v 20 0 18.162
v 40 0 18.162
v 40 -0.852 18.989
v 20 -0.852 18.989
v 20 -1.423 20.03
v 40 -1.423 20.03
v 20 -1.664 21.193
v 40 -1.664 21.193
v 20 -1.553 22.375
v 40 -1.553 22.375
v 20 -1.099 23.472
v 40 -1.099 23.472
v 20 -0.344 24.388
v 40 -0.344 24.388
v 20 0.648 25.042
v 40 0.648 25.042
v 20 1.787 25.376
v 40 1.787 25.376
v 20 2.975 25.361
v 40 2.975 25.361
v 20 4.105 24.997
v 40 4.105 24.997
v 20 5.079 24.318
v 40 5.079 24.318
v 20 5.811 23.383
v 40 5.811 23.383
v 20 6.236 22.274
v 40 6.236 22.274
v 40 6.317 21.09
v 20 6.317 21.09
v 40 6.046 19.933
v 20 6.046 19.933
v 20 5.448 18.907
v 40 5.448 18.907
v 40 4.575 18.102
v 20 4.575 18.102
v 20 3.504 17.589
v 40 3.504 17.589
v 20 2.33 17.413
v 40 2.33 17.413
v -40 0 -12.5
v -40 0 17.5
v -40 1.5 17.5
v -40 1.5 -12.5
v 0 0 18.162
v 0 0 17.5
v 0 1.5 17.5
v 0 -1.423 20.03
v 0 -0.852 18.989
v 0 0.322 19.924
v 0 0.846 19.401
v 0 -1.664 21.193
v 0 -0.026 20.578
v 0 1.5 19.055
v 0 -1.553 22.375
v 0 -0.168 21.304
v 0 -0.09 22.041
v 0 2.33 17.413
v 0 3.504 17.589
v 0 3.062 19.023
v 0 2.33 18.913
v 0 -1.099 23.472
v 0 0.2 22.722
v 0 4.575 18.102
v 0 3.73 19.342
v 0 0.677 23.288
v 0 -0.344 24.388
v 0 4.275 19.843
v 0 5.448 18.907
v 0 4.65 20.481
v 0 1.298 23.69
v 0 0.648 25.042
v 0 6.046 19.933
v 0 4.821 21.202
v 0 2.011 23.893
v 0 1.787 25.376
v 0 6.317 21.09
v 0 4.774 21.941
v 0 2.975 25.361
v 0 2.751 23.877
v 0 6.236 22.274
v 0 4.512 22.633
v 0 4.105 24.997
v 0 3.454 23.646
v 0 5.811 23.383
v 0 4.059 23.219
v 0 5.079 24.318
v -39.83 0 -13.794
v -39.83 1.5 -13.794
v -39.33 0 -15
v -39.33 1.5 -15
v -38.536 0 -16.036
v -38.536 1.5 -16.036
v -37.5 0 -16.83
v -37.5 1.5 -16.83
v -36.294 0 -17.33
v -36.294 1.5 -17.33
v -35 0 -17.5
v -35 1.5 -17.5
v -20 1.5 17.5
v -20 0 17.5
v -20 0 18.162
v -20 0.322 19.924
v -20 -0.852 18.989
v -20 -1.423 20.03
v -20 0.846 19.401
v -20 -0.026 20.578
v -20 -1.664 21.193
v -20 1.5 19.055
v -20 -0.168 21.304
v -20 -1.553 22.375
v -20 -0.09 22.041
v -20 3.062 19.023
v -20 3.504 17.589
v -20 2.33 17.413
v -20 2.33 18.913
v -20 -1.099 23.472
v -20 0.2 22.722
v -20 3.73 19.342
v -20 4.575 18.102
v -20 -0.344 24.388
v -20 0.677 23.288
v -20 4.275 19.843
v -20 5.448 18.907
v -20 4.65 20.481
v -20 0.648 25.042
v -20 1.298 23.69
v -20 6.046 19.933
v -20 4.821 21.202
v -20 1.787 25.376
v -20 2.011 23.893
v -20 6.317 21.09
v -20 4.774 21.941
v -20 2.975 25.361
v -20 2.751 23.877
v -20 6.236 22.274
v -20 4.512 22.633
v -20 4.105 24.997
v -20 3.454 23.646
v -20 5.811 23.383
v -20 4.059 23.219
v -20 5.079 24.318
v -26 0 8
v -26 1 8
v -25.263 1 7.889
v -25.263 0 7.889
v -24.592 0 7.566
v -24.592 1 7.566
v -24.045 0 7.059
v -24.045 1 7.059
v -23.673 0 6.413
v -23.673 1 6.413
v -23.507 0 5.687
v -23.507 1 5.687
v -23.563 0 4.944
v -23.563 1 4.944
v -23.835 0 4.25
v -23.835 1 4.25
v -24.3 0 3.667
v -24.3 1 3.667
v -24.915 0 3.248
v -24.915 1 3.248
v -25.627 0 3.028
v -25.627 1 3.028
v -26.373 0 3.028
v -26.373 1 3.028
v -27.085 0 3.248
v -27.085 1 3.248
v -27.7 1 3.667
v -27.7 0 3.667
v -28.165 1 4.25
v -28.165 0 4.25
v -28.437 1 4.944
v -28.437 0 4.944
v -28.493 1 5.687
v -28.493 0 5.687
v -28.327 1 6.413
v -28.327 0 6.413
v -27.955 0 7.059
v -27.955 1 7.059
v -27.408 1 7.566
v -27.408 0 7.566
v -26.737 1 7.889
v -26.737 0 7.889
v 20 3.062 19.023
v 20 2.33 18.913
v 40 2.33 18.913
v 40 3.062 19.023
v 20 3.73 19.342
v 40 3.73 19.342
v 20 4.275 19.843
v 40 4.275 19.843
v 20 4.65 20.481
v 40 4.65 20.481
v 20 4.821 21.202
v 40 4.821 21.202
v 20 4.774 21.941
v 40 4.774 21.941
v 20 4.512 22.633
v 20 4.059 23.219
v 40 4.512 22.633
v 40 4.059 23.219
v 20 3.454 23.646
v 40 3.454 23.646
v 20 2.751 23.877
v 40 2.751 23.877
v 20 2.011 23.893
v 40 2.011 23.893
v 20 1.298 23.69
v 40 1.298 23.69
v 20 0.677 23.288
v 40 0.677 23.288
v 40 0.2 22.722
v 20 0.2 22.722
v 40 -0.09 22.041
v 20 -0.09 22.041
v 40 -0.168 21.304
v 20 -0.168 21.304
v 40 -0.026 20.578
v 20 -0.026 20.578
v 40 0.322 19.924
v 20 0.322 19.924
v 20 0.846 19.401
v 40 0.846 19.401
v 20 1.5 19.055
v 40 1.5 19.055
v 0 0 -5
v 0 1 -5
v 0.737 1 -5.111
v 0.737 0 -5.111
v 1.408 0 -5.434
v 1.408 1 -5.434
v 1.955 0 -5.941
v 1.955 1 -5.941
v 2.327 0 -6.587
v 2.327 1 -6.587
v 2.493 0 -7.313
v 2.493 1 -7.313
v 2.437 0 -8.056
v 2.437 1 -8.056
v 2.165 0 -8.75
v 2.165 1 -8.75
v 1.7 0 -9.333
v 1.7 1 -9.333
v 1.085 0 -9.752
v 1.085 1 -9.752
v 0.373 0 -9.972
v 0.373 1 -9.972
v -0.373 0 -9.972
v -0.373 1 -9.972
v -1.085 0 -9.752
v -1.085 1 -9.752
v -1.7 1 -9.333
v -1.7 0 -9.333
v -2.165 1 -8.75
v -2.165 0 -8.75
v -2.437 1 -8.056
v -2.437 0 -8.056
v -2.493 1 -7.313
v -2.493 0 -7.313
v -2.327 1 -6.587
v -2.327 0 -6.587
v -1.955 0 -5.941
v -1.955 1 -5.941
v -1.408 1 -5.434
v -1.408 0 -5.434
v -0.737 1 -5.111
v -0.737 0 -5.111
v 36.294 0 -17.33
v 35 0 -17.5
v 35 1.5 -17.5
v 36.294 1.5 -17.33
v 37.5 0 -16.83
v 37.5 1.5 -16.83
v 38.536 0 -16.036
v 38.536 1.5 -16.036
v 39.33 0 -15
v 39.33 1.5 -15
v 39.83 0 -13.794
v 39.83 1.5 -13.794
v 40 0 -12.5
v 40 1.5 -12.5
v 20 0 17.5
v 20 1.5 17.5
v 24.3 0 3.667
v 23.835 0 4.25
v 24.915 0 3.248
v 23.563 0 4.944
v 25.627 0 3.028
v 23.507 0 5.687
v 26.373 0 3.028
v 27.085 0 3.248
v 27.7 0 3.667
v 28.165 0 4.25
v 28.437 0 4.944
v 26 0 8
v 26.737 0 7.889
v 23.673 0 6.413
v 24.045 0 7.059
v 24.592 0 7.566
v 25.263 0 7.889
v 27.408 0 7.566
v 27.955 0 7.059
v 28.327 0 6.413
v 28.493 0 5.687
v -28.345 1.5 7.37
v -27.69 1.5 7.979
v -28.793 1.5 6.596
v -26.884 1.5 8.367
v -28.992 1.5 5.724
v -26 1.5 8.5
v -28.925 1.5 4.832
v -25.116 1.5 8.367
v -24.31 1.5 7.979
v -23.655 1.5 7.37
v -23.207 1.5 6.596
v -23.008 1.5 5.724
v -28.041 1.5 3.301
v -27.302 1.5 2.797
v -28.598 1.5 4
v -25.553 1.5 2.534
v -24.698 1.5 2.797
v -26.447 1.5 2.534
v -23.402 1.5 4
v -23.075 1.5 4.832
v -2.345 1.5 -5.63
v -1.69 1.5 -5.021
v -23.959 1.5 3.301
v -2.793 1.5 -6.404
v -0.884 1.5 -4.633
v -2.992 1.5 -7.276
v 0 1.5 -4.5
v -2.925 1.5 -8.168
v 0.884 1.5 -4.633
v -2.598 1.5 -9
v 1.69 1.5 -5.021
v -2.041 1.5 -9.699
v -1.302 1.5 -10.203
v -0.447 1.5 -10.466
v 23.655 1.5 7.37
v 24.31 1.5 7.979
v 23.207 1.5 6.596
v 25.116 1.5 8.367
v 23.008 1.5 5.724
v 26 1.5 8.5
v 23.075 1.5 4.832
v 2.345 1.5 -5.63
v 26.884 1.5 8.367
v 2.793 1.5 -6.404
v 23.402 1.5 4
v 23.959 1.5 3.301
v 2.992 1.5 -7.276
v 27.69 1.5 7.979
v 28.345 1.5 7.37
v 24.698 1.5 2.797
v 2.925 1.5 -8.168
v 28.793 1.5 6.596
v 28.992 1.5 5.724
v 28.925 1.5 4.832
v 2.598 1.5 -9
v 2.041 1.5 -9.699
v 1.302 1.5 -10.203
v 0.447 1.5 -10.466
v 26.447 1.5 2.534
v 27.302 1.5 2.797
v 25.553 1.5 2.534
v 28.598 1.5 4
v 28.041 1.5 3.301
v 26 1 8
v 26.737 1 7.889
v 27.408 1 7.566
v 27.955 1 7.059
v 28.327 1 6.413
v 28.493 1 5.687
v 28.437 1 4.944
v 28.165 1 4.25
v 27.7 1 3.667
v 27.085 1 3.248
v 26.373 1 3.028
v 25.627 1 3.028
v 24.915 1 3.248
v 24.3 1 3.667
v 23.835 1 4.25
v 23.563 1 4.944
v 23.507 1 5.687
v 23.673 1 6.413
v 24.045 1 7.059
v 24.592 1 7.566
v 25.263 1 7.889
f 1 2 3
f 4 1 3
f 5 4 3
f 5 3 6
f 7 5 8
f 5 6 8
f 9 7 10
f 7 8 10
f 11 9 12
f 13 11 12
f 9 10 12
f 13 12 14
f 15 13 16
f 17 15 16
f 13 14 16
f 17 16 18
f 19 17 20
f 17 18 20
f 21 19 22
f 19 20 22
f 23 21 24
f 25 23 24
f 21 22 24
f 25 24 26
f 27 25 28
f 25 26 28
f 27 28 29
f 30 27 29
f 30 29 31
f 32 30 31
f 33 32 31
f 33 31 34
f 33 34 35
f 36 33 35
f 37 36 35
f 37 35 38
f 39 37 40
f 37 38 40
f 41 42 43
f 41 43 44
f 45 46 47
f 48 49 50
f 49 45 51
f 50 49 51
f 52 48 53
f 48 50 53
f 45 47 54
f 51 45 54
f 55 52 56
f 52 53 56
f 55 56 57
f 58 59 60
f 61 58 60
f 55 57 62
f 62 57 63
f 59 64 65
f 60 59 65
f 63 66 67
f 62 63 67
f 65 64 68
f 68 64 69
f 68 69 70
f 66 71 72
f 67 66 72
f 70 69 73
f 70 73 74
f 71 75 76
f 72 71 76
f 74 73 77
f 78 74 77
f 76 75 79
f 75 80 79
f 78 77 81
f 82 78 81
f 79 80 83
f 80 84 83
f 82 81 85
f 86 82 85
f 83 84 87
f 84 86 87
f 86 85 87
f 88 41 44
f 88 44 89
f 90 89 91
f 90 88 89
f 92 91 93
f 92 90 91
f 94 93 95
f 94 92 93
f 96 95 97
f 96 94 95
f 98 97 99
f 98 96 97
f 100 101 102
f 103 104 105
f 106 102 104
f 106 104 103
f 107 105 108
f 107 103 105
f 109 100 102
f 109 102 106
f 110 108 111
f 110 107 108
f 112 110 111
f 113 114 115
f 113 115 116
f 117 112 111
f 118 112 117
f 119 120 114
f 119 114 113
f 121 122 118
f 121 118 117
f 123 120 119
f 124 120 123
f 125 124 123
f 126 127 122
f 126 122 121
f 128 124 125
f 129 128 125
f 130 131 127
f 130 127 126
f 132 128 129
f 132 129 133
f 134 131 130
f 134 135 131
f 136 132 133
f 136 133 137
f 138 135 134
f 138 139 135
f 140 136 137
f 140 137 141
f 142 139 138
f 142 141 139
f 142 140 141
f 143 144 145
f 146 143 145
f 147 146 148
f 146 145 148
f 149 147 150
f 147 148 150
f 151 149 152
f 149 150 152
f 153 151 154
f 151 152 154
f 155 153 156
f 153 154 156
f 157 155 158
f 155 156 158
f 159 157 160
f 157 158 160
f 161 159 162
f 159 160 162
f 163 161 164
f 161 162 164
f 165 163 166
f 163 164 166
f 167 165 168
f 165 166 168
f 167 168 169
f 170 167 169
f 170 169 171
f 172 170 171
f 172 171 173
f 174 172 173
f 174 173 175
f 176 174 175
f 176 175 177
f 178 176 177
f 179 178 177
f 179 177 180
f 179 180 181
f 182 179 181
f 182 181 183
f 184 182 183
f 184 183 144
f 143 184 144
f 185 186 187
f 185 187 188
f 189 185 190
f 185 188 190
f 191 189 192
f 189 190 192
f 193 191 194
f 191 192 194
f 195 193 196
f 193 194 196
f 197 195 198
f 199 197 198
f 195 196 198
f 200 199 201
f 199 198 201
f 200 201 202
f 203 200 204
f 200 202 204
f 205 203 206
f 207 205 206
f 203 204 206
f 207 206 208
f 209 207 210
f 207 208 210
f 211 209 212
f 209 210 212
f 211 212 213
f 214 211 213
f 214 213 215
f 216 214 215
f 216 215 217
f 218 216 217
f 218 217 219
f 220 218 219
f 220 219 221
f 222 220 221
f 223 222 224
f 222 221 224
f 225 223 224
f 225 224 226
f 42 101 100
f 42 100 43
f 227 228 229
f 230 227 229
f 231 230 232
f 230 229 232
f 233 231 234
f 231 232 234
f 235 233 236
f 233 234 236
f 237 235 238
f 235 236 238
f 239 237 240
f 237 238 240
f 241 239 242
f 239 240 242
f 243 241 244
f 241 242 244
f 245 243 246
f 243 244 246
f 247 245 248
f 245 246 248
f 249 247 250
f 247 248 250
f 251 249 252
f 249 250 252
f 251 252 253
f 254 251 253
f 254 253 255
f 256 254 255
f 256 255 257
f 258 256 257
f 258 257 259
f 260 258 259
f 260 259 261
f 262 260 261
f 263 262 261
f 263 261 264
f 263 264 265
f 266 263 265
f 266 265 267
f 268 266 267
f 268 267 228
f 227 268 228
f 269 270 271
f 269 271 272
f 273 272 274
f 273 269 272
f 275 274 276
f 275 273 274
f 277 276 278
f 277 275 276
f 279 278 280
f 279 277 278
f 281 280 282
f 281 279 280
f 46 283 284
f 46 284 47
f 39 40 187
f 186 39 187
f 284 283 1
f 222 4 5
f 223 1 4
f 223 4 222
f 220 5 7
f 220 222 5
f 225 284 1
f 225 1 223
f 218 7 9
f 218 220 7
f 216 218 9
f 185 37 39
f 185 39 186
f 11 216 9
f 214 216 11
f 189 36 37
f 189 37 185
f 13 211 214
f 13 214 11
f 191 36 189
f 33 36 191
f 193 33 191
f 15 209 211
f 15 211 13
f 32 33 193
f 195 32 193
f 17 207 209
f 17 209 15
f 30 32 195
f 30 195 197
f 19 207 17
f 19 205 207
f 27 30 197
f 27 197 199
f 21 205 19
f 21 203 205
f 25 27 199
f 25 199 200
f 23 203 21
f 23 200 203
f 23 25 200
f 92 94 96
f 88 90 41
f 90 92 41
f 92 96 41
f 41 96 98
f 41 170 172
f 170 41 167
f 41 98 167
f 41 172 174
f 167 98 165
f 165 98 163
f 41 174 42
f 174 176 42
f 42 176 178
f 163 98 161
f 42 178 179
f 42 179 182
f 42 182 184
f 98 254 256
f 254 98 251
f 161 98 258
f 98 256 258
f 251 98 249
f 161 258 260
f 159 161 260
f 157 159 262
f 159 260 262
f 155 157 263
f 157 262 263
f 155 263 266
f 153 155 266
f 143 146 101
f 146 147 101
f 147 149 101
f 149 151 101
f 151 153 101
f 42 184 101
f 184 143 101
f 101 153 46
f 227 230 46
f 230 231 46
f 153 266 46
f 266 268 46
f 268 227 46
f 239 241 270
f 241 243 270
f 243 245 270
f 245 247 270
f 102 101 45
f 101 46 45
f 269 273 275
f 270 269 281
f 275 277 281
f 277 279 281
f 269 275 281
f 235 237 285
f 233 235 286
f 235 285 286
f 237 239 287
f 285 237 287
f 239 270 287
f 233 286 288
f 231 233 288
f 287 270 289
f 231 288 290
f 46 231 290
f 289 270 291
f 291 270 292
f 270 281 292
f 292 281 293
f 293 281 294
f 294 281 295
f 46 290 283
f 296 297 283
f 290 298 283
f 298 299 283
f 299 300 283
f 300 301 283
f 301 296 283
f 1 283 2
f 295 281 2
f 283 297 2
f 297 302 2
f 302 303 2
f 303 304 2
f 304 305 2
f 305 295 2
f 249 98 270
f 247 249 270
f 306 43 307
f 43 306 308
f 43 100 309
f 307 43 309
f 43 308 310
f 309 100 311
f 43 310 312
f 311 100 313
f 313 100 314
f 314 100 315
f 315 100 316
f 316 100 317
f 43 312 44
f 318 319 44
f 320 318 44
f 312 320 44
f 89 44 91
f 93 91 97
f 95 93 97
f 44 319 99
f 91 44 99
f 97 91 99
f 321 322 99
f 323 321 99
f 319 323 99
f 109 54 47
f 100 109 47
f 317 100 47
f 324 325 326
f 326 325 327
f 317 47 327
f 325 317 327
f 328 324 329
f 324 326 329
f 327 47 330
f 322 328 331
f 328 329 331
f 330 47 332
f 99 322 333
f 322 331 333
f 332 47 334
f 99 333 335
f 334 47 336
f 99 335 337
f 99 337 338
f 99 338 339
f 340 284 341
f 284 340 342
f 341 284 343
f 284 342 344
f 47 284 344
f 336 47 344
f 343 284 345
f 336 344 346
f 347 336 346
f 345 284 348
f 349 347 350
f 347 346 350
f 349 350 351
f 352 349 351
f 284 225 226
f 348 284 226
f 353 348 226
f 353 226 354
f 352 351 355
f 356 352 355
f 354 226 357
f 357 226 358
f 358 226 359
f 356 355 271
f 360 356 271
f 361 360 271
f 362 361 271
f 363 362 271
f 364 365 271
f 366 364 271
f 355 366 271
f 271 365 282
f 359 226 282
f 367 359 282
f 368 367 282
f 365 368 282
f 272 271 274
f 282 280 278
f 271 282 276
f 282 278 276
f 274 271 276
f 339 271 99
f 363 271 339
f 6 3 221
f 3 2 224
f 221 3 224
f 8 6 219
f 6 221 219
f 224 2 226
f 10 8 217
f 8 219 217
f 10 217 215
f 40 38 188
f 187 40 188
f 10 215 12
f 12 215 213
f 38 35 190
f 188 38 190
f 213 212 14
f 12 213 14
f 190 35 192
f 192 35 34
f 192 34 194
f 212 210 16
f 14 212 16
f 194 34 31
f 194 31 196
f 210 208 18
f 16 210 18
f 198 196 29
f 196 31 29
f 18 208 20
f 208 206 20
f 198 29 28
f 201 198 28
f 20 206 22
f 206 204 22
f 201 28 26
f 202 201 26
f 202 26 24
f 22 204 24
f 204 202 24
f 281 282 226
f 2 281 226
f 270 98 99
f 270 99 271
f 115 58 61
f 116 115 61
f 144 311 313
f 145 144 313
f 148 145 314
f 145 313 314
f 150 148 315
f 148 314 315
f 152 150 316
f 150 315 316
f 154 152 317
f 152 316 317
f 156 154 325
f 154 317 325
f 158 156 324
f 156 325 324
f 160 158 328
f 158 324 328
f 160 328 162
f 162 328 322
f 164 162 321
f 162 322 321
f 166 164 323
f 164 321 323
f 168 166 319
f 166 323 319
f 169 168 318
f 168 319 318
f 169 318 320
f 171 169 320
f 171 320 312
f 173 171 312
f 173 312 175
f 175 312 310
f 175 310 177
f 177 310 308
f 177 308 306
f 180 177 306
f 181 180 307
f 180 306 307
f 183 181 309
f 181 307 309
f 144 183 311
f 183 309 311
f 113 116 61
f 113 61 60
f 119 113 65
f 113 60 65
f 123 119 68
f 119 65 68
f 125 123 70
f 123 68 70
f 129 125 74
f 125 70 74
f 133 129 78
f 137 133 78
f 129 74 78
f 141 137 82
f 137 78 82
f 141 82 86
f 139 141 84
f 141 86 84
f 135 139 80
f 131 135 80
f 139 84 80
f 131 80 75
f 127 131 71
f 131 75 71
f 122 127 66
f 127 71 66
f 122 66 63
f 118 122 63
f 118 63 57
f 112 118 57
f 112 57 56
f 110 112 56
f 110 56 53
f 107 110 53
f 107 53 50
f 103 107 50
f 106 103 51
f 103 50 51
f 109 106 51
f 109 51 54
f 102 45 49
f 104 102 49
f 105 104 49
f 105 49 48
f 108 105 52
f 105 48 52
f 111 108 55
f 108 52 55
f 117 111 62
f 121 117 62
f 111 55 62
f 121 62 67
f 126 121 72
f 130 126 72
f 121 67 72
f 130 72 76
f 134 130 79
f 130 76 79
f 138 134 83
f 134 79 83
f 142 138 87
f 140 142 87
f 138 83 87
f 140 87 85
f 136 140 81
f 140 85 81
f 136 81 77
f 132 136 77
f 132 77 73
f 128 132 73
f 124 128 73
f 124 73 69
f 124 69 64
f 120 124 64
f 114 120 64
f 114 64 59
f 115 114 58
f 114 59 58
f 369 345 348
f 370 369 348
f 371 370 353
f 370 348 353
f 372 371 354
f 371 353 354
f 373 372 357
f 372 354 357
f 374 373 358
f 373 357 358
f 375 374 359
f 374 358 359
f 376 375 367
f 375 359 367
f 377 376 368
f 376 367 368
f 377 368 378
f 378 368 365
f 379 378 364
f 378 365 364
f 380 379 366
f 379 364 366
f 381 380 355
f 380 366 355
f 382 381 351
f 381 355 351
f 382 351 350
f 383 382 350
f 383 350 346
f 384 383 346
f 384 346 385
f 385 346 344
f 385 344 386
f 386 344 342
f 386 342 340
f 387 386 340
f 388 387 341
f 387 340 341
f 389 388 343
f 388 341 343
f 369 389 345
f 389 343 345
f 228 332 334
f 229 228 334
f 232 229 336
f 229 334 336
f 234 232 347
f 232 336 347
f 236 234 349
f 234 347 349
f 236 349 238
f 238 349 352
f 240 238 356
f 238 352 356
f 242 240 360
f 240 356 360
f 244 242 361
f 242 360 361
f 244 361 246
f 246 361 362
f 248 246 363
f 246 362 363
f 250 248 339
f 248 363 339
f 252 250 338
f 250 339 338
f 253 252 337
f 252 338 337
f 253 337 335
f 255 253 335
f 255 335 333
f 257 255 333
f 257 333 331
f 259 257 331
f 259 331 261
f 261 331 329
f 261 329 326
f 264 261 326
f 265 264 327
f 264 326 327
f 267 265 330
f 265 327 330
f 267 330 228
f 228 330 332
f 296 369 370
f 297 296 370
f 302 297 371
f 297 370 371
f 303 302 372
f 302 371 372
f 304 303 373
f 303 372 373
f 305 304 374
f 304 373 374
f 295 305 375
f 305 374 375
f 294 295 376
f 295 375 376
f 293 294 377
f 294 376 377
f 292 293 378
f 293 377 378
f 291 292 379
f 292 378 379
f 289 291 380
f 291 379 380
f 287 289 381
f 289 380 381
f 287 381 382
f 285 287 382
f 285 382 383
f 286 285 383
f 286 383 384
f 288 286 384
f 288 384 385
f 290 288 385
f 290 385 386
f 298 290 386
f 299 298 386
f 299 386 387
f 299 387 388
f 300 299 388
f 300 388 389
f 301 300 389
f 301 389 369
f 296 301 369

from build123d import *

# Parameters (mm, degrees)
BOSS_EXTRUDE1_DEPTH = 1.5
BOSS_EXTRUDE3_DEPTH = 20
LPATTERN1_COUNT     = 2
LPATTERN1_PITCH     = 40
SKETCH3_R           = 2.5
CUT_EXTRUDE1_DEPTH  = 20
CHAMFER1_SIZE       = 0.5


with BuildPart() as part:
    # Sketch1 → Boss-Extrude1 (new body)
    with BuildSketch(Plane(origin=(0, 0, 0), x_dir=(1, 0, 0), z_dir=(0, 1, 0))):
        with BuildLine():
            Line((-35, 17.5), (35, 17.5))
            ThreePointArc((35, 17.5), (38.535533906, 16.035533906), (40, 12.5))
            Line((40, 12.5), (40, -17.5))
            Line((40, -17.5), (-40, -17.5))
            Line((-40, -17.5), (-40, 12.5))
            ThreePointArc((-40, 12.5), (-38.535533906, 16.035533906), (-35, 17.5))
        make_face()
    extrude(amount=BOSS_EXTRUDE1_DEPTH)

    # Sketch2 → Boss-Extrude3 (add)
    with BuildSketch(Plane(origin=(40, 0, 0), x_dir=(0, 0, -1), z_dir=(1, 0, 0))):
        with BuildLine():
            Line((-17.5, 0), (-18.161538273, 0))
            ThreePointArc((-18.161538273, 0), (-25.221236665, 3.55341606), (-17.412973279, 2.329843428))
            Line((-17.412973279, 2.329843428), (-18.912973279, 2.329843428))
            ThreePointArc((-18.912973279, 2.329843428), (-23.877281896, 2.750774588), (-19.054719713, 1.5))
            Line((-19.054719713, 1.5), (-17.5, 1.5))
            Line((-17.5, 1.5), (-17.5, 0))
        make_face()
    boss_extrude3 = extrude(amount=-BOSS_EXTRUDE3_DEPTH)

    # LPattern1: Boss-Extrude3 ×2
    with Locations(*[(-i * LPATTERN1_PITCH, 0, 0) for i in range(1, LPATTERN1_COUNT)]):
        add(boss_extrude3)

    # Sketch3 → Cut-Extrude1 (cut)
    with BuildSketch(Plane(origin=(0, 1.5, 0), x_dir=(1, 0, 0), z_dir=(0, 1, 0))):
        with Locations(Location((0, 7.5, 0), (0, 0, 270))):
            Circle(SKETCH3_R)
        with Locations(Location((-26, -5.5, 0), (0, 0, 270))):
            Circle(SKETCH3_R)
        with Locations(Location((26, -5.5, 0), (0, 0, 270))):
            Circle(SKETCH3_R)
    extrude(amount=-CUT_EXTRUDE1_DEPTH, mode=Mode.SUBTRACT)

    # Chamfer1
    chamfer1_edges = [part.edges().sort_by_distance(p)[0] for p in [
        (0, 1.5, -10),
        (-26, 1.5, 3),
        (26, 1.5, 3),
    ]]
    chamfer(chamfer1_edges, length=CHAMFER1_SIZE)


solid = part.part
